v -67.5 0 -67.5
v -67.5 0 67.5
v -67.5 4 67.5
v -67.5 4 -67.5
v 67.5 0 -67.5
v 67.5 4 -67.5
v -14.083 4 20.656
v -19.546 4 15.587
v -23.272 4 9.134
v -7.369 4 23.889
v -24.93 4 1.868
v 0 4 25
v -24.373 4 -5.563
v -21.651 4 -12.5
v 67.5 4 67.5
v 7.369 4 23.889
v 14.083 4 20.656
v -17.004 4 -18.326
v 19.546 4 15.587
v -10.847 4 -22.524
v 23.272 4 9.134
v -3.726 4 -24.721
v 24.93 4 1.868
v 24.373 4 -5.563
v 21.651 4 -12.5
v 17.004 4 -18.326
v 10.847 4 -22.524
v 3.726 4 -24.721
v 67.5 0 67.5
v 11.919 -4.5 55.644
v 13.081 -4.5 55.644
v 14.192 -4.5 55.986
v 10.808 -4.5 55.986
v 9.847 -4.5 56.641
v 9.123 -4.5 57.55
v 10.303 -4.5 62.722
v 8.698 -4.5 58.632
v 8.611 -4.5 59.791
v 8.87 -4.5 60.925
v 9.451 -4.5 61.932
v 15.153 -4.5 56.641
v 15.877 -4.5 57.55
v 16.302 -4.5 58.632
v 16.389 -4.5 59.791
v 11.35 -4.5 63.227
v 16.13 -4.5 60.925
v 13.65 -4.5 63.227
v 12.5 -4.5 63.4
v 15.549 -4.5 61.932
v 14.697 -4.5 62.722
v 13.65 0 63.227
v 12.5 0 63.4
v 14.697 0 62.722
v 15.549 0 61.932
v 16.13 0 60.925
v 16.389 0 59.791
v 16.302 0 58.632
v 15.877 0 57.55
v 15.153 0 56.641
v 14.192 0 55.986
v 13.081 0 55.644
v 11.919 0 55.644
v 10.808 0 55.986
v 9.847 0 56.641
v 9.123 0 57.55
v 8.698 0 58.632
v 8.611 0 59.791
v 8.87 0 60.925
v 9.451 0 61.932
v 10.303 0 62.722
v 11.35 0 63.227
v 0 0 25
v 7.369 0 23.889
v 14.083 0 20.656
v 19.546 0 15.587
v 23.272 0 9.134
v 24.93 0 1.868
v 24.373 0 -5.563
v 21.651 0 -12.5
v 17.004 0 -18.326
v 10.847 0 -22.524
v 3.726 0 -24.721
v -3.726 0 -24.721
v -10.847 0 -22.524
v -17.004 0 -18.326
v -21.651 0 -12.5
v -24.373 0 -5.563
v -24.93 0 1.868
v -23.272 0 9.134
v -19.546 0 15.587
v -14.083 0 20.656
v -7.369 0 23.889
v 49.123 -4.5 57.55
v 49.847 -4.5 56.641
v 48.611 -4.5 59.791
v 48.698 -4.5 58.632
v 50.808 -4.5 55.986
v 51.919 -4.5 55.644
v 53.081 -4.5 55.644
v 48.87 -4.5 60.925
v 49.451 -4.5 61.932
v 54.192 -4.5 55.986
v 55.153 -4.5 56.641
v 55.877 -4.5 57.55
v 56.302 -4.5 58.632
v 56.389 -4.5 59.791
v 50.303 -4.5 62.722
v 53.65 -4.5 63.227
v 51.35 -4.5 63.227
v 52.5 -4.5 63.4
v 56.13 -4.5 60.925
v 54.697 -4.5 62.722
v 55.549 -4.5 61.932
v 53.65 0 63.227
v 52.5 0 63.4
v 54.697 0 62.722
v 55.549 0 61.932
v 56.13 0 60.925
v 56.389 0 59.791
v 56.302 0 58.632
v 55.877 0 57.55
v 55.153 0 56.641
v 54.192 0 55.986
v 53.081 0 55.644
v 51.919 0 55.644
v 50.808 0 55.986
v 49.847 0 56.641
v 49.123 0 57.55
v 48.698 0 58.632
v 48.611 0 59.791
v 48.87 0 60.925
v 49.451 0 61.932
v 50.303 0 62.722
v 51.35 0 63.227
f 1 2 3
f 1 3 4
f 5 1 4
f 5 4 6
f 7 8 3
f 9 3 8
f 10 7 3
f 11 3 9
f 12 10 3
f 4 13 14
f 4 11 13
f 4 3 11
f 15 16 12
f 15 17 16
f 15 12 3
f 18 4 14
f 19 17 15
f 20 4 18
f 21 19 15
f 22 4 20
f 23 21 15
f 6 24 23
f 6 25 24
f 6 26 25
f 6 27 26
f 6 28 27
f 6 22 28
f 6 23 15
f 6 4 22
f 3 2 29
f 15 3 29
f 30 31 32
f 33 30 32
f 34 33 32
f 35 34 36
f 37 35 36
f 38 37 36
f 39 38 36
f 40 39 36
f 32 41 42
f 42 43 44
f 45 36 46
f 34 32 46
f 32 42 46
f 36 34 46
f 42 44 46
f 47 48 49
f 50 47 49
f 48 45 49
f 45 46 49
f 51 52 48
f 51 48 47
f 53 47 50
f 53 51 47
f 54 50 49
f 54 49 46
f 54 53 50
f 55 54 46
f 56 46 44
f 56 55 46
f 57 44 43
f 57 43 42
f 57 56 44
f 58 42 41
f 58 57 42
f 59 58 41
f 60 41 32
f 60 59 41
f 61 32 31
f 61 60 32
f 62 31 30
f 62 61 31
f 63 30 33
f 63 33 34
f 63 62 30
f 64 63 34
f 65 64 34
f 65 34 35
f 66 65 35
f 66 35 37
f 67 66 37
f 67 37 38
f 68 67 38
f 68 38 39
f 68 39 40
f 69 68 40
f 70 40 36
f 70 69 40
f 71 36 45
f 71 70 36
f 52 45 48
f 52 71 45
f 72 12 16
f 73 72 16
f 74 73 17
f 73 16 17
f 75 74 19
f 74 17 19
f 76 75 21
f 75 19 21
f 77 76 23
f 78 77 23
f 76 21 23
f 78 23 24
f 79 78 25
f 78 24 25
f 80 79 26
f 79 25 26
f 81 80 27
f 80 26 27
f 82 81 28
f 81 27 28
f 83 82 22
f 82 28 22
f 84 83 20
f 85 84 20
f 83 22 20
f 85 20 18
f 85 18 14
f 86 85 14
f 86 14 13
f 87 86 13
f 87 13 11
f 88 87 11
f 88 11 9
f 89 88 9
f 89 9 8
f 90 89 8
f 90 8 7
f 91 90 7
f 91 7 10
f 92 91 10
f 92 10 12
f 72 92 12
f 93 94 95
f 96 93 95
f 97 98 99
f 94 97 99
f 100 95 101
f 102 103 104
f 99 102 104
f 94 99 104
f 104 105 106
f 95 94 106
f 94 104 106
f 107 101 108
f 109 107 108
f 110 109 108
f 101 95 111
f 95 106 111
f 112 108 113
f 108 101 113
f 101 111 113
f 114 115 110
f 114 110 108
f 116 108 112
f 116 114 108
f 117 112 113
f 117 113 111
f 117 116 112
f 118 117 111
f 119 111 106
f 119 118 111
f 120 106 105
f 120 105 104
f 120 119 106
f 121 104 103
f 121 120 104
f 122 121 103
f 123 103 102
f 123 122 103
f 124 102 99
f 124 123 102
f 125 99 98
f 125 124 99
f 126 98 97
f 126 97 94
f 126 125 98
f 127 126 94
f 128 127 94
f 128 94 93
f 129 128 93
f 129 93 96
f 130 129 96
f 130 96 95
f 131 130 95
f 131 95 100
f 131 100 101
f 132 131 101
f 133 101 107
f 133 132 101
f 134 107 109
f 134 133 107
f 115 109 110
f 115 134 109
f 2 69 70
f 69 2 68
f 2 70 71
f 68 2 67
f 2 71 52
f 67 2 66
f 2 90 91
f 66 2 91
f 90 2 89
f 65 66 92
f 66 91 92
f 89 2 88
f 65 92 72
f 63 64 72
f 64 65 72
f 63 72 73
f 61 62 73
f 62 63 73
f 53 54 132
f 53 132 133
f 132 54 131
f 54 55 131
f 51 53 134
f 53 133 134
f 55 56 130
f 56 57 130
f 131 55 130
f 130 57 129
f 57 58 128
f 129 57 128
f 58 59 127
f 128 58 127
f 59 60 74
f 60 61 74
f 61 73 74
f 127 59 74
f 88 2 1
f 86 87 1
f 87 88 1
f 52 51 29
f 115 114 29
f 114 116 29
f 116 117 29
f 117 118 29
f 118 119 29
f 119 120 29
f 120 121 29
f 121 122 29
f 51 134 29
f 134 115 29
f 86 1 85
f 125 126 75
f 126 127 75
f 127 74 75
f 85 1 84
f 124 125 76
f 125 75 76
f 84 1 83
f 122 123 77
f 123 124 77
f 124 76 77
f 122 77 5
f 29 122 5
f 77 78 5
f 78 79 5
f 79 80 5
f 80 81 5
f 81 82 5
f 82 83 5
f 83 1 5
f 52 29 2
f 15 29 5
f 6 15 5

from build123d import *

# Parameters (mm, degrees)
SKETCH1_W           = 135
SKETCH1_H           = 135
BOSS_EXTRUDE1_DEPTH = 4
SKETCH1_3_R         = 3.9
BOSS_EXTRUDE2_DEPTH = 4.5
SKETCH2_R           = 25
CUT_EXTRUDE1_DEPTH  = 10


with BuildPart() as part:
    # Sketch1 → Boss-Extrude1 (new body)
    with BuildSketch(Plane(origin=(0, 0, 0), x_dir=(1, 0, 0), z_dir=(0, 1, 0))):
        Rectangle(SKETCH1_W, SKETCH1_H)
    extrude(amount=BOSS_EXTRUDE1_DEPTH)

    # Sketch1<3> → Boss-Extrude2 (add)
    with BuildSketch(Plane(origin=(0, 0, 0), x_dir=(1, 0, 0), z_dir=(0, 1, 0))):
        with Locations((12.5, -59.5)):
            Circle(SKETCH1_3_R)
        with Locations((52.5, -59.5)):
            Circle(SKETCH1_3_R)
    extrude(amount=-BOSS_EXTRUDE2_DEPTH)

    # Sketch2 → Cut-Extrude1 (cut)
    with BuildSketch(Plane(origin=(0, 4, 0), x_dir=(1, 0, 0), z_dir=(0, 1, 0))):
        Circle(SKETCH2_R)
    extrude(amount=-CUT_EXTRUDE1_DEPTH, mode=Mode.SUBTRACT)


solid = part.part
